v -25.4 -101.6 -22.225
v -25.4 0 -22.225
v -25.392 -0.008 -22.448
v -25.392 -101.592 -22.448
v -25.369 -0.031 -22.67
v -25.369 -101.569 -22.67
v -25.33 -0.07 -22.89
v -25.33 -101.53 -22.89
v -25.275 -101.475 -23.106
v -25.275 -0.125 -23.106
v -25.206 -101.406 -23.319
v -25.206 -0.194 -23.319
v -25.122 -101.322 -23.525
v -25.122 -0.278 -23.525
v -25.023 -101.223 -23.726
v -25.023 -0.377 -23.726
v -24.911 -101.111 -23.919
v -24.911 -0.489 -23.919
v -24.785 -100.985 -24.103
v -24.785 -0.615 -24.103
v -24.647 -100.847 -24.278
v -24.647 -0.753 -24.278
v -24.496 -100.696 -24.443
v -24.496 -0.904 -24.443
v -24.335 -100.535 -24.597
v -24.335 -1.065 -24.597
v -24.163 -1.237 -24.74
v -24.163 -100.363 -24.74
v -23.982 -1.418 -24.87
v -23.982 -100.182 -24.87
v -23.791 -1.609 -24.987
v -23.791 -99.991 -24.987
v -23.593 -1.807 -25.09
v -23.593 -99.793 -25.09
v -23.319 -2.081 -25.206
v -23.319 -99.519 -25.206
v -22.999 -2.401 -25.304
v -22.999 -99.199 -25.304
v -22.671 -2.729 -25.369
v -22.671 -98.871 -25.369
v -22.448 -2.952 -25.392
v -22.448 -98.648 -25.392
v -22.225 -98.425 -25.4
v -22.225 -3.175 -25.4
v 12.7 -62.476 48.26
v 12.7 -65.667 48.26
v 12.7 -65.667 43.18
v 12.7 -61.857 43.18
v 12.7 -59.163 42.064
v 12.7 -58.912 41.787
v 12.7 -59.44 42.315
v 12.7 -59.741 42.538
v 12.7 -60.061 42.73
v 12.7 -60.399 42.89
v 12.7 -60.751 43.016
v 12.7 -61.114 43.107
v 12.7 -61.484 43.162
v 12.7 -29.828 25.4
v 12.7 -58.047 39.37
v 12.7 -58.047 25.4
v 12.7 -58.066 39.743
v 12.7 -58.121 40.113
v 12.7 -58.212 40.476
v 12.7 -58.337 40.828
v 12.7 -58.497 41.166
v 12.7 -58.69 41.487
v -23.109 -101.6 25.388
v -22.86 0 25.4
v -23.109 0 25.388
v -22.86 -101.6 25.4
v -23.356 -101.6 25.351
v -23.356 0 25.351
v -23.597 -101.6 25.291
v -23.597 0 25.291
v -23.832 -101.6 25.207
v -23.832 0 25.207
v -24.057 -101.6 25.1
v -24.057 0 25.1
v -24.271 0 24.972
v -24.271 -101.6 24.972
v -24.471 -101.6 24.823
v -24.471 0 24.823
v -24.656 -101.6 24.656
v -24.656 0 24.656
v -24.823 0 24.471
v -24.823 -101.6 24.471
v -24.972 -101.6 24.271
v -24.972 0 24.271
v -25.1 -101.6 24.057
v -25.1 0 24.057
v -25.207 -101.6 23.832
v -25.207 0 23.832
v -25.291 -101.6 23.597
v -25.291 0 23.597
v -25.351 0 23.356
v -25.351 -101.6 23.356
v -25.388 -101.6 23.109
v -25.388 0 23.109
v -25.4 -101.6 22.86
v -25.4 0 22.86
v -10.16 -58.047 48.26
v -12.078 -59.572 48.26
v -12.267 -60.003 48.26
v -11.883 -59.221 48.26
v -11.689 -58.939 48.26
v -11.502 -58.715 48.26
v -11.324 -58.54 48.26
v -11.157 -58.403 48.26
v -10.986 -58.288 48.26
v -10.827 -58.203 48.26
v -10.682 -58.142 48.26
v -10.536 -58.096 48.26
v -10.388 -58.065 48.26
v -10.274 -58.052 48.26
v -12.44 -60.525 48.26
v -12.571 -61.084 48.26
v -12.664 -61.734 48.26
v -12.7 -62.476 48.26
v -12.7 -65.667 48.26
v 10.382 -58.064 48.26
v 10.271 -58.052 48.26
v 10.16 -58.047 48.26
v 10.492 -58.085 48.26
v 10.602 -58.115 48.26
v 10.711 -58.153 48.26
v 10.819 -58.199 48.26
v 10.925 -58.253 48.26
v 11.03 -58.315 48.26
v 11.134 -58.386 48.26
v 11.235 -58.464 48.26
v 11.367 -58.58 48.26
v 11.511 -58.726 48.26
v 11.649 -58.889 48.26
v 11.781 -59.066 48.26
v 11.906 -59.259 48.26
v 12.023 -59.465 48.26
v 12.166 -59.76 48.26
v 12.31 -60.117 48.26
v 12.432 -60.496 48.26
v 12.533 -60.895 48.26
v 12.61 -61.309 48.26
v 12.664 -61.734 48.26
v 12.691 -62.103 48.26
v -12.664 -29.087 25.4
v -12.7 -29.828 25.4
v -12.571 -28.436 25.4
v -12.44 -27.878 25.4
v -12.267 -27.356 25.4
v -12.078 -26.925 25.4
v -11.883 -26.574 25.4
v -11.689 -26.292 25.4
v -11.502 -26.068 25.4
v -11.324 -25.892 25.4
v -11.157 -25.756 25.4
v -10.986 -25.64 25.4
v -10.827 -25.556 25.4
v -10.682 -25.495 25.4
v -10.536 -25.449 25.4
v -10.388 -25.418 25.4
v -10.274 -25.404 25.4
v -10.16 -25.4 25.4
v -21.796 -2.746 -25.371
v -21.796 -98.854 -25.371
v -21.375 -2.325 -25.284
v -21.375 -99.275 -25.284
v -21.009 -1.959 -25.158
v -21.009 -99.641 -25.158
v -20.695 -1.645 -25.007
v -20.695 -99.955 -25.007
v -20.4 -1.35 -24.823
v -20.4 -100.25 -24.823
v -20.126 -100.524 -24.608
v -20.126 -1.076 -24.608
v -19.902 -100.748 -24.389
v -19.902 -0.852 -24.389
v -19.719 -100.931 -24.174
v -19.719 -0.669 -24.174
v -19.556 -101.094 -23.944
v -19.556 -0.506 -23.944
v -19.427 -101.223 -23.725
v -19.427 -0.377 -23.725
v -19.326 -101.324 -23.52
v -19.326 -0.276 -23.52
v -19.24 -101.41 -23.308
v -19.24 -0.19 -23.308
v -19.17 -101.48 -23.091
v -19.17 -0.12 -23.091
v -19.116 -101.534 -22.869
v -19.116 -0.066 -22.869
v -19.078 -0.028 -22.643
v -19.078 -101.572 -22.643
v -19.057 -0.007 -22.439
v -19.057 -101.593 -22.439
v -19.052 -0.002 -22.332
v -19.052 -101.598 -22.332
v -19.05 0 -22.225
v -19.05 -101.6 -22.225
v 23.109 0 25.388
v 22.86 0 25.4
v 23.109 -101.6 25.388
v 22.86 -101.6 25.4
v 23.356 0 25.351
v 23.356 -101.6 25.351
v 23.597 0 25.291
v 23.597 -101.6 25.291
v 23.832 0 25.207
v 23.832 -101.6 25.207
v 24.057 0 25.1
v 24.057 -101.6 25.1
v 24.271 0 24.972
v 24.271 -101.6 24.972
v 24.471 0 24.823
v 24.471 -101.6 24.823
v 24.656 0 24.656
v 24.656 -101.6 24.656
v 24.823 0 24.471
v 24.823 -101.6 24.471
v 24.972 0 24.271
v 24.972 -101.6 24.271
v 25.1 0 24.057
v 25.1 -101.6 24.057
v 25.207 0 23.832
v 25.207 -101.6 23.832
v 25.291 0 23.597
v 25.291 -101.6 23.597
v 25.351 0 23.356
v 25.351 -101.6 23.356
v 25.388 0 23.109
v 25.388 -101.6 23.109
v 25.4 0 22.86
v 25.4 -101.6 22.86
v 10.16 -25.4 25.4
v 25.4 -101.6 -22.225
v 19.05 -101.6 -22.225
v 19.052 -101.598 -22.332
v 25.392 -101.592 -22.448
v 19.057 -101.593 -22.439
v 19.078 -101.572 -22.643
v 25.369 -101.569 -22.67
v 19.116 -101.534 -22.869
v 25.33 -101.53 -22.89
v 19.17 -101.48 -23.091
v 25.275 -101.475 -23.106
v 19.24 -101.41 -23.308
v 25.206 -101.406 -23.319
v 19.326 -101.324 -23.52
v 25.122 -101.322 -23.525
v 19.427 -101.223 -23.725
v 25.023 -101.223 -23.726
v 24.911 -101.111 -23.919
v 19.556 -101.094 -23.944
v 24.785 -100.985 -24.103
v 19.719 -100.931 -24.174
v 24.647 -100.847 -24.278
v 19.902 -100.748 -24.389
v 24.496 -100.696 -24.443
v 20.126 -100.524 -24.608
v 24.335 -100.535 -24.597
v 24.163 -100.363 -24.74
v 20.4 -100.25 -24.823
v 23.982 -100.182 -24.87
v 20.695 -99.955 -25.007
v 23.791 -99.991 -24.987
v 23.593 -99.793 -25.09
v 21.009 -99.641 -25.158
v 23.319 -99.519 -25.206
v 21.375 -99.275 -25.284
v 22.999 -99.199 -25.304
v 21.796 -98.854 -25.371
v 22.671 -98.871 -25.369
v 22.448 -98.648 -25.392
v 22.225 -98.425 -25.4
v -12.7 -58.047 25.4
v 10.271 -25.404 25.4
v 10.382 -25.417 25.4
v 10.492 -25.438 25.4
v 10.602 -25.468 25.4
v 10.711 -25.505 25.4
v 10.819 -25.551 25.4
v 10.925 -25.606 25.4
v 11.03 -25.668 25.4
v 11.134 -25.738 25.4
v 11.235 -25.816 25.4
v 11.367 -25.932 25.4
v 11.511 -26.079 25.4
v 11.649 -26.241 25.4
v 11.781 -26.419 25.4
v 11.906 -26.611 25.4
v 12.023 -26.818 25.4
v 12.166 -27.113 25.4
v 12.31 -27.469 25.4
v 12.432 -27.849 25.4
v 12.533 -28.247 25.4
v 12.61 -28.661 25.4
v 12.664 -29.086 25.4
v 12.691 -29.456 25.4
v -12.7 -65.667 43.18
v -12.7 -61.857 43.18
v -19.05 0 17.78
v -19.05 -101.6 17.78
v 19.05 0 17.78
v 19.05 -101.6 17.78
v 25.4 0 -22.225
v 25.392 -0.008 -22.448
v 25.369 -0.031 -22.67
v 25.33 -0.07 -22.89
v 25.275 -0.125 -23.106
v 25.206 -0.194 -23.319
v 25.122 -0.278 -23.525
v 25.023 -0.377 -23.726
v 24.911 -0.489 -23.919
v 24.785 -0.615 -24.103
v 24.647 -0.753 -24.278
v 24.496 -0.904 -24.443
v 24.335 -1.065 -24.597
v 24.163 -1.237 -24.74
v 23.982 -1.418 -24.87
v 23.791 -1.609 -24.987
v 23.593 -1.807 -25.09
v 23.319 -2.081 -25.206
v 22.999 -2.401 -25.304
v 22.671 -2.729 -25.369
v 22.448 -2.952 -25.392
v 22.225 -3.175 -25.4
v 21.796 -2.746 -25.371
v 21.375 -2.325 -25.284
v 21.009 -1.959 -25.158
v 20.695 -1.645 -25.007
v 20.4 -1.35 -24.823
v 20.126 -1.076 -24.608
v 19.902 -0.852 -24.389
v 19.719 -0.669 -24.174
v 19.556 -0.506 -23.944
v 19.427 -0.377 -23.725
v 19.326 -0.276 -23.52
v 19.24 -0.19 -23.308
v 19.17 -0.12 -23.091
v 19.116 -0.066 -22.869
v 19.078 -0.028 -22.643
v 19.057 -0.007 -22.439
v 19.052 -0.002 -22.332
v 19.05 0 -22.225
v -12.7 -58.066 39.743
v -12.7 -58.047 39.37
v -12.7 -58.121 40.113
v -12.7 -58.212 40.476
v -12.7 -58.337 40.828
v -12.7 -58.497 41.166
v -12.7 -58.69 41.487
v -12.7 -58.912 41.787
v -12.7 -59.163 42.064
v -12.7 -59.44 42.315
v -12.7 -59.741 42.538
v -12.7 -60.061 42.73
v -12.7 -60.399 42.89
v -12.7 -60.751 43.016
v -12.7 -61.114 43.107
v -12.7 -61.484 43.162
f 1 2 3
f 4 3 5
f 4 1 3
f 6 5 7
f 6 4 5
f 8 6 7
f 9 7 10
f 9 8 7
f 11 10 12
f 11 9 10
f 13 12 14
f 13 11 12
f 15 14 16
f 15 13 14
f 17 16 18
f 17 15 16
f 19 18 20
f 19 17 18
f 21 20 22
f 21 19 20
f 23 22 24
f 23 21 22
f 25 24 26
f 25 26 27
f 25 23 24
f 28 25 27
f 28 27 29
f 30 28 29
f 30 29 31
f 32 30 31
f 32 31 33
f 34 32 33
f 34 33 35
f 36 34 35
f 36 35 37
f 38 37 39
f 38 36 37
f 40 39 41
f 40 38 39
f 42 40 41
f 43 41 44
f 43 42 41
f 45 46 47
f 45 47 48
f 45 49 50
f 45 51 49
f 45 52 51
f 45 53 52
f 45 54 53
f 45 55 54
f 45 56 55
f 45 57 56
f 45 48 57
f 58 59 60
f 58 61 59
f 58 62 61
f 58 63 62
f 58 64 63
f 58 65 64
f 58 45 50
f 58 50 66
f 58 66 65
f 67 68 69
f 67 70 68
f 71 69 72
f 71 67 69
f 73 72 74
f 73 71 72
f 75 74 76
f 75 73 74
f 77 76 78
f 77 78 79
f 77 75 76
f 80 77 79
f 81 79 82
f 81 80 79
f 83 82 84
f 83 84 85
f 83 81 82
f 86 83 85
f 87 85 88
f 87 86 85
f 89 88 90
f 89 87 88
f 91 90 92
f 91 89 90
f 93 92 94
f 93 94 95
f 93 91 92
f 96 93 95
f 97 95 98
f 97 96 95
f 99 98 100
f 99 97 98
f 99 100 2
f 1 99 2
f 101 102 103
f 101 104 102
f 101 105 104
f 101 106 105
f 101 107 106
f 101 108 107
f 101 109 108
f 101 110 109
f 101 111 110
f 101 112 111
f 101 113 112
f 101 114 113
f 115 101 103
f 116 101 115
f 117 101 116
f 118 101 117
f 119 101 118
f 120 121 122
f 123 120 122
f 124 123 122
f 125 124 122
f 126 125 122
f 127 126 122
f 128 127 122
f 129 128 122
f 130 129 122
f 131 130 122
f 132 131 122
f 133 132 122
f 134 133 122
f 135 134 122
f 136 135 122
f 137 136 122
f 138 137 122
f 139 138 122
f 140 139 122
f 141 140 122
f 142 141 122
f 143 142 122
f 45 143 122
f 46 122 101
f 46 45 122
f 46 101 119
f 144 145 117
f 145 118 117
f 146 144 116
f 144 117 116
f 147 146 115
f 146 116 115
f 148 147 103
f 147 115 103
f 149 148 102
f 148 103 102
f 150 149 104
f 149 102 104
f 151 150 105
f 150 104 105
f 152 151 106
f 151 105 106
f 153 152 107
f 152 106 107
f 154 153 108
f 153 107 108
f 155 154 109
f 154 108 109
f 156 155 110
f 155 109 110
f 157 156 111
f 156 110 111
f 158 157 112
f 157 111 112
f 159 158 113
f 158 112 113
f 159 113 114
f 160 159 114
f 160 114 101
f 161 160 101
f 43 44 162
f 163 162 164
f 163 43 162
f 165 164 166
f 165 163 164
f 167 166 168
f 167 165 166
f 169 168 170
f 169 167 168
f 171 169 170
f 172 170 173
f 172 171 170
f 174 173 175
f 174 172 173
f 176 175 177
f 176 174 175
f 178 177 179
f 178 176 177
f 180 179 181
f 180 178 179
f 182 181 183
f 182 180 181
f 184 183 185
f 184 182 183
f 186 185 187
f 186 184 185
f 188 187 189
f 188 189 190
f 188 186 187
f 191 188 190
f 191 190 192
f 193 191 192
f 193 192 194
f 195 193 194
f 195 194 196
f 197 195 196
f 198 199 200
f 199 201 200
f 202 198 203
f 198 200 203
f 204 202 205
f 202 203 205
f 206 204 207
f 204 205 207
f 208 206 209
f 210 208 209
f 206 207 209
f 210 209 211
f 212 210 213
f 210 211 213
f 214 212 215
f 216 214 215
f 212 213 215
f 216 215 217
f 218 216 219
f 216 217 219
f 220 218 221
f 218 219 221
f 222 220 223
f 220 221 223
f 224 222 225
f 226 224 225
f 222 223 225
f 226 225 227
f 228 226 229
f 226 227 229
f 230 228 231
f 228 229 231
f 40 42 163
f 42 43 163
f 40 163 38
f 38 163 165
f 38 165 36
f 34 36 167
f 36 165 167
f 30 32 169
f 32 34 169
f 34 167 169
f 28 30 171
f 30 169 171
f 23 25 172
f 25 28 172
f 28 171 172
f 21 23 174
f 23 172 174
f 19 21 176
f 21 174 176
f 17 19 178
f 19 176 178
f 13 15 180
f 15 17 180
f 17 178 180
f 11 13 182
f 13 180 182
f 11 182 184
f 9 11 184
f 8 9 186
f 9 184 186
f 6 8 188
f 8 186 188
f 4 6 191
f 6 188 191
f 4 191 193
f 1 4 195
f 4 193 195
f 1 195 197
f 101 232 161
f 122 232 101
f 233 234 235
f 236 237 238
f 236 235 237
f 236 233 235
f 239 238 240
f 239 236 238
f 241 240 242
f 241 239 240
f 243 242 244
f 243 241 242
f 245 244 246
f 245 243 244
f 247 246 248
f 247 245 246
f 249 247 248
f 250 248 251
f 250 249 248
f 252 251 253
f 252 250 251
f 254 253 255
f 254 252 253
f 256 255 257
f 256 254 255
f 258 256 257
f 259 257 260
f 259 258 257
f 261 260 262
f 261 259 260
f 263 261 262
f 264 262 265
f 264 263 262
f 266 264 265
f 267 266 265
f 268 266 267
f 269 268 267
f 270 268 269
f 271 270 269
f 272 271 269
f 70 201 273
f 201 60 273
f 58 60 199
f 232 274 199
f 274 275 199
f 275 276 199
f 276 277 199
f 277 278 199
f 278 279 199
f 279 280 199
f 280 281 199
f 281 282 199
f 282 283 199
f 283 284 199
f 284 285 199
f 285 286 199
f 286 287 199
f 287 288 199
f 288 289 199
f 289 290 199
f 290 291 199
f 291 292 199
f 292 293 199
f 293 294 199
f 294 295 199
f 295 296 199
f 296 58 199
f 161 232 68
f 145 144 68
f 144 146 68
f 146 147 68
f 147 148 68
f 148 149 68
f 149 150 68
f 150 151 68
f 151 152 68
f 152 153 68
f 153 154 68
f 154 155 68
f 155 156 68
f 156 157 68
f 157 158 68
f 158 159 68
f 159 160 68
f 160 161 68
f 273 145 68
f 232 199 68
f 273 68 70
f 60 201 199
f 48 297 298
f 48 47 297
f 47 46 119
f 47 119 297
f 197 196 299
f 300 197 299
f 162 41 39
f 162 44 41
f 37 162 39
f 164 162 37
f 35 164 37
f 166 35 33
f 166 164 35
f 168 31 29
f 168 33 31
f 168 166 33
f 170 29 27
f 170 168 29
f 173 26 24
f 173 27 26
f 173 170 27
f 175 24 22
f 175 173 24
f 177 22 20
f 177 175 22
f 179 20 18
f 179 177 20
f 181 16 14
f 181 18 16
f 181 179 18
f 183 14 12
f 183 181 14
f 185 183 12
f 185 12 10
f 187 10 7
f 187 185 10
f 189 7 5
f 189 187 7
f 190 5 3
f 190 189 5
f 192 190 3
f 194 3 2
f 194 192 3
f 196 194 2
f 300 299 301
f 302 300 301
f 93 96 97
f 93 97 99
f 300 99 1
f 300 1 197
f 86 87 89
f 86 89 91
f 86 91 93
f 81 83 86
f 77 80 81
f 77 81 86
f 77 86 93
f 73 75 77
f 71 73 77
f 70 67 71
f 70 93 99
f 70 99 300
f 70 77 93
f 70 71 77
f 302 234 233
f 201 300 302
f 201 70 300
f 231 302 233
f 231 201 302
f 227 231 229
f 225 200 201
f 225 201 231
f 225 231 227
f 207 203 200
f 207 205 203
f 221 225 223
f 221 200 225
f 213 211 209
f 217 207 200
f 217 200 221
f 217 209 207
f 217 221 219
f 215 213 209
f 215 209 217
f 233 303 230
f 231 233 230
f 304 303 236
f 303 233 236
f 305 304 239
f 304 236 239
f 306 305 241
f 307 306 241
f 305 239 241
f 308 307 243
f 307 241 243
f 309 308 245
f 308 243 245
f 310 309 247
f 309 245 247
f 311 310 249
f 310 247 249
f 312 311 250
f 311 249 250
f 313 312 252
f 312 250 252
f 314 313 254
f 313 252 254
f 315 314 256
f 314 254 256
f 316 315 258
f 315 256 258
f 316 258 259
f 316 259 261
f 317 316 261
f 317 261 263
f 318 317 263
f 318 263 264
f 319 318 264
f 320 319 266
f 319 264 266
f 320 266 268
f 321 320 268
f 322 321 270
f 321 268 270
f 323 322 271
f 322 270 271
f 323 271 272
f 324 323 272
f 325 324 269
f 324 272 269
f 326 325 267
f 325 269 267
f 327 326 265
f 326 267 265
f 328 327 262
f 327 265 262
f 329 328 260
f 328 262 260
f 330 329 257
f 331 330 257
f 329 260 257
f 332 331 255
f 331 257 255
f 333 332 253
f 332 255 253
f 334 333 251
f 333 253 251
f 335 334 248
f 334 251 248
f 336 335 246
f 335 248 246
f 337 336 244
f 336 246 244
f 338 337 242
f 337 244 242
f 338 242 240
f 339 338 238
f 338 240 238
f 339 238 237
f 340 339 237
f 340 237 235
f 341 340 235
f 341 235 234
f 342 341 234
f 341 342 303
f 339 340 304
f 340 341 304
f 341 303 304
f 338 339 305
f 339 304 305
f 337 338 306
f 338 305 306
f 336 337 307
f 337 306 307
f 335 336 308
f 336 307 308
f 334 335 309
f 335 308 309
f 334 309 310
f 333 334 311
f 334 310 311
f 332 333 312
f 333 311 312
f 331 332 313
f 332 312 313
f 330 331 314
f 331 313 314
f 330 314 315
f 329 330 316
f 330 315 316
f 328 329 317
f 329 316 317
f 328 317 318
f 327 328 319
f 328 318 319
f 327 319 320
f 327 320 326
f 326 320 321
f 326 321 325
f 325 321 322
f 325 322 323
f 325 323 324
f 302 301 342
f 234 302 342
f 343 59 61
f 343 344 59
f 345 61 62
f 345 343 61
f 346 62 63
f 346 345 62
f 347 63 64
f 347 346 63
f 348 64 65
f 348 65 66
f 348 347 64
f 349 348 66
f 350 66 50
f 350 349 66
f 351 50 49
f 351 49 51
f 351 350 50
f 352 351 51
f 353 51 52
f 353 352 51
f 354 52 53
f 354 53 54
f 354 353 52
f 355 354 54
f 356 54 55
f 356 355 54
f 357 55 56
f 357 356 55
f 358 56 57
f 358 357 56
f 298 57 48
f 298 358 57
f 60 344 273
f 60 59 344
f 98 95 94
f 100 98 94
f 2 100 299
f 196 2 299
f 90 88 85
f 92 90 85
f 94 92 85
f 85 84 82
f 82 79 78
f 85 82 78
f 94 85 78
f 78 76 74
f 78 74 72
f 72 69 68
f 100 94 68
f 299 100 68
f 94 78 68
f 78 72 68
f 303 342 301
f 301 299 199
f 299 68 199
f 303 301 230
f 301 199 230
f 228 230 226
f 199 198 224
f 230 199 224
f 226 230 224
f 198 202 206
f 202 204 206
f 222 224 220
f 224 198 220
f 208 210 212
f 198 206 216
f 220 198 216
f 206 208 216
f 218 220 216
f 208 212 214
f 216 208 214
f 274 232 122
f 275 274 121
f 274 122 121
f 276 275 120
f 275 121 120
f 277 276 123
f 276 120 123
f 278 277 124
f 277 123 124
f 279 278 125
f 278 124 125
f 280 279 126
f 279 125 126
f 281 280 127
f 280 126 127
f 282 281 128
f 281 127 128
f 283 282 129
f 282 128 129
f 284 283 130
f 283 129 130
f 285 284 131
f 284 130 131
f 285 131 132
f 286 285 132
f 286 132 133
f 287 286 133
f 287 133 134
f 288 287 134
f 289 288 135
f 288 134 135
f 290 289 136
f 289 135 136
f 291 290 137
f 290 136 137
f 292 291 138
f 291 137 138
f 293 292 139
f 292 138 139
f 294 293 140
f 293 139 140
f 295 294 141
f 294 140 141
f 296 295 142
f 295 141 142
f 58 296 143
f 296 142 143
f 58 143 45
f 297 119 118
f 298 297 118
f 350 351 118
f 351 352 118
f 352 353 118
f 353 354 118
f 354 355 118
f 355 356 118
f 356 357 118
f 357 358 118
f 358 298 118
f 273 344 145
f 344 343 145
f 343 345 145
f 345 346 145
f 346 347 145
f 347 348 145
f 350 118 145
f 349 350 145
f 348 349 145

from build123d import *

# Parameters (mm, degrees)
F1_DEPTH      = 101.6
F2_R          = 3.17499
F3_R          = 3.17499
F5_DEPTH      = 12.7
F5_DEPTH_BACK = 12.7
F6_R          = 2.54
F7_R          = 2.54
F8_R          = 2.54
F9_R          = 2.54
F10_R         = 3.81


# Not quite as in the source:
# - a fillet or chamfer is up to 0.001 mm smaller than in the source, because OpenCascade refuses the exact size


with BuildPart() as f1:
    # F0 (on Front) → F1 (new body)
    with BuildSketch(Plane.XZ):
        Polygon((-25.4, 25.4), (-25.4, -25.4), (-19.05, -25.4), (-19.05, 17.78), (19.05, 17.78), (19.05, -25.4), (25.4, -25.4), (25.4, 25.4), align=None)
    extrude(amount=F1_DEPTH)

    # F2 (radius 3.175 in the source; OpenCascade refuses exactly that, so slightly less here)
    f2_edges = [f1.edges().sort_by_distance(p)[0] for p in [
        (-25.4, -50.8, -25.4),
        (-19.05, -50.8, -25.4),
        (-22.225, 0, -25.4),
        (-22.225, -101.6, -25.4),
    ]]
    fillet(f2_edges, radius=F2_R)

    # F3 (radius 3.175 in the source; OpenCascade refuses exactly that, so slightly less here)
    f3_edges = [f1.edges().sort_by_distance(p)[0] for p in [
        (19.05, -50.8, -25.4),
        (25.4, -50.8, -25.4),
        (22.225, 0, -25.4),
        (22.225, -101.6, -25.4),
    ]]
    fillet(f3_edges, radius=F3_R)

    # F4 (on Right) → F5 (join, two sides)
    with BuildSketch(Plane.YZ) as f5_sk:
        Polygon((-58.0474634341, 25.4), (-25.4, 25.4), (-58.0474634341, 48.26), (-65.6674634341, 48.26), (-65.6674634341, 43.18), (-58.0474634341, 43.18), align=None)
    extrude(amount=F5_DEPTH)
    extrude(f5_sk.sketch, amount=-F5_DEPTH_BACK)

    # F6
    f6_edges = [f1.edges().sort_by_distance(p)[0] for p in [
        (25.4, -50.8, 25.4),
    ]]
    fillet(f6_edges, radius=F6_R)

    # F7
    f7_edges = [f1.edges().sort_by_distance(p)[0] for p in [
        (-25.4, -50.8, 25.4),
    ]]
    fillet(f7_edges, radius=F7_R)

    # F8
    f8_edges = [f1.edges().sort_by_distance(p)[0] for p in [
        (-12.7, -41.723732, 36.83),
    ]]
    fillet(f8_edges, radius=F8_R)

    # F9
    f9_edges = [f1.edges().sort_by_distance(p)[0] for p in [
        (12.7, -41.723732, 36.83),
    ]]
    fillet(f9_edges, radius=F9_R)

    # F10
    f10_edges = [f1.edges().sort_by_distance(p)[0] for p in [
        (0, -58.047463, 43.18),
    ]]
    fillet(f10_edges, radius=F10_R)


solid = f1.part
